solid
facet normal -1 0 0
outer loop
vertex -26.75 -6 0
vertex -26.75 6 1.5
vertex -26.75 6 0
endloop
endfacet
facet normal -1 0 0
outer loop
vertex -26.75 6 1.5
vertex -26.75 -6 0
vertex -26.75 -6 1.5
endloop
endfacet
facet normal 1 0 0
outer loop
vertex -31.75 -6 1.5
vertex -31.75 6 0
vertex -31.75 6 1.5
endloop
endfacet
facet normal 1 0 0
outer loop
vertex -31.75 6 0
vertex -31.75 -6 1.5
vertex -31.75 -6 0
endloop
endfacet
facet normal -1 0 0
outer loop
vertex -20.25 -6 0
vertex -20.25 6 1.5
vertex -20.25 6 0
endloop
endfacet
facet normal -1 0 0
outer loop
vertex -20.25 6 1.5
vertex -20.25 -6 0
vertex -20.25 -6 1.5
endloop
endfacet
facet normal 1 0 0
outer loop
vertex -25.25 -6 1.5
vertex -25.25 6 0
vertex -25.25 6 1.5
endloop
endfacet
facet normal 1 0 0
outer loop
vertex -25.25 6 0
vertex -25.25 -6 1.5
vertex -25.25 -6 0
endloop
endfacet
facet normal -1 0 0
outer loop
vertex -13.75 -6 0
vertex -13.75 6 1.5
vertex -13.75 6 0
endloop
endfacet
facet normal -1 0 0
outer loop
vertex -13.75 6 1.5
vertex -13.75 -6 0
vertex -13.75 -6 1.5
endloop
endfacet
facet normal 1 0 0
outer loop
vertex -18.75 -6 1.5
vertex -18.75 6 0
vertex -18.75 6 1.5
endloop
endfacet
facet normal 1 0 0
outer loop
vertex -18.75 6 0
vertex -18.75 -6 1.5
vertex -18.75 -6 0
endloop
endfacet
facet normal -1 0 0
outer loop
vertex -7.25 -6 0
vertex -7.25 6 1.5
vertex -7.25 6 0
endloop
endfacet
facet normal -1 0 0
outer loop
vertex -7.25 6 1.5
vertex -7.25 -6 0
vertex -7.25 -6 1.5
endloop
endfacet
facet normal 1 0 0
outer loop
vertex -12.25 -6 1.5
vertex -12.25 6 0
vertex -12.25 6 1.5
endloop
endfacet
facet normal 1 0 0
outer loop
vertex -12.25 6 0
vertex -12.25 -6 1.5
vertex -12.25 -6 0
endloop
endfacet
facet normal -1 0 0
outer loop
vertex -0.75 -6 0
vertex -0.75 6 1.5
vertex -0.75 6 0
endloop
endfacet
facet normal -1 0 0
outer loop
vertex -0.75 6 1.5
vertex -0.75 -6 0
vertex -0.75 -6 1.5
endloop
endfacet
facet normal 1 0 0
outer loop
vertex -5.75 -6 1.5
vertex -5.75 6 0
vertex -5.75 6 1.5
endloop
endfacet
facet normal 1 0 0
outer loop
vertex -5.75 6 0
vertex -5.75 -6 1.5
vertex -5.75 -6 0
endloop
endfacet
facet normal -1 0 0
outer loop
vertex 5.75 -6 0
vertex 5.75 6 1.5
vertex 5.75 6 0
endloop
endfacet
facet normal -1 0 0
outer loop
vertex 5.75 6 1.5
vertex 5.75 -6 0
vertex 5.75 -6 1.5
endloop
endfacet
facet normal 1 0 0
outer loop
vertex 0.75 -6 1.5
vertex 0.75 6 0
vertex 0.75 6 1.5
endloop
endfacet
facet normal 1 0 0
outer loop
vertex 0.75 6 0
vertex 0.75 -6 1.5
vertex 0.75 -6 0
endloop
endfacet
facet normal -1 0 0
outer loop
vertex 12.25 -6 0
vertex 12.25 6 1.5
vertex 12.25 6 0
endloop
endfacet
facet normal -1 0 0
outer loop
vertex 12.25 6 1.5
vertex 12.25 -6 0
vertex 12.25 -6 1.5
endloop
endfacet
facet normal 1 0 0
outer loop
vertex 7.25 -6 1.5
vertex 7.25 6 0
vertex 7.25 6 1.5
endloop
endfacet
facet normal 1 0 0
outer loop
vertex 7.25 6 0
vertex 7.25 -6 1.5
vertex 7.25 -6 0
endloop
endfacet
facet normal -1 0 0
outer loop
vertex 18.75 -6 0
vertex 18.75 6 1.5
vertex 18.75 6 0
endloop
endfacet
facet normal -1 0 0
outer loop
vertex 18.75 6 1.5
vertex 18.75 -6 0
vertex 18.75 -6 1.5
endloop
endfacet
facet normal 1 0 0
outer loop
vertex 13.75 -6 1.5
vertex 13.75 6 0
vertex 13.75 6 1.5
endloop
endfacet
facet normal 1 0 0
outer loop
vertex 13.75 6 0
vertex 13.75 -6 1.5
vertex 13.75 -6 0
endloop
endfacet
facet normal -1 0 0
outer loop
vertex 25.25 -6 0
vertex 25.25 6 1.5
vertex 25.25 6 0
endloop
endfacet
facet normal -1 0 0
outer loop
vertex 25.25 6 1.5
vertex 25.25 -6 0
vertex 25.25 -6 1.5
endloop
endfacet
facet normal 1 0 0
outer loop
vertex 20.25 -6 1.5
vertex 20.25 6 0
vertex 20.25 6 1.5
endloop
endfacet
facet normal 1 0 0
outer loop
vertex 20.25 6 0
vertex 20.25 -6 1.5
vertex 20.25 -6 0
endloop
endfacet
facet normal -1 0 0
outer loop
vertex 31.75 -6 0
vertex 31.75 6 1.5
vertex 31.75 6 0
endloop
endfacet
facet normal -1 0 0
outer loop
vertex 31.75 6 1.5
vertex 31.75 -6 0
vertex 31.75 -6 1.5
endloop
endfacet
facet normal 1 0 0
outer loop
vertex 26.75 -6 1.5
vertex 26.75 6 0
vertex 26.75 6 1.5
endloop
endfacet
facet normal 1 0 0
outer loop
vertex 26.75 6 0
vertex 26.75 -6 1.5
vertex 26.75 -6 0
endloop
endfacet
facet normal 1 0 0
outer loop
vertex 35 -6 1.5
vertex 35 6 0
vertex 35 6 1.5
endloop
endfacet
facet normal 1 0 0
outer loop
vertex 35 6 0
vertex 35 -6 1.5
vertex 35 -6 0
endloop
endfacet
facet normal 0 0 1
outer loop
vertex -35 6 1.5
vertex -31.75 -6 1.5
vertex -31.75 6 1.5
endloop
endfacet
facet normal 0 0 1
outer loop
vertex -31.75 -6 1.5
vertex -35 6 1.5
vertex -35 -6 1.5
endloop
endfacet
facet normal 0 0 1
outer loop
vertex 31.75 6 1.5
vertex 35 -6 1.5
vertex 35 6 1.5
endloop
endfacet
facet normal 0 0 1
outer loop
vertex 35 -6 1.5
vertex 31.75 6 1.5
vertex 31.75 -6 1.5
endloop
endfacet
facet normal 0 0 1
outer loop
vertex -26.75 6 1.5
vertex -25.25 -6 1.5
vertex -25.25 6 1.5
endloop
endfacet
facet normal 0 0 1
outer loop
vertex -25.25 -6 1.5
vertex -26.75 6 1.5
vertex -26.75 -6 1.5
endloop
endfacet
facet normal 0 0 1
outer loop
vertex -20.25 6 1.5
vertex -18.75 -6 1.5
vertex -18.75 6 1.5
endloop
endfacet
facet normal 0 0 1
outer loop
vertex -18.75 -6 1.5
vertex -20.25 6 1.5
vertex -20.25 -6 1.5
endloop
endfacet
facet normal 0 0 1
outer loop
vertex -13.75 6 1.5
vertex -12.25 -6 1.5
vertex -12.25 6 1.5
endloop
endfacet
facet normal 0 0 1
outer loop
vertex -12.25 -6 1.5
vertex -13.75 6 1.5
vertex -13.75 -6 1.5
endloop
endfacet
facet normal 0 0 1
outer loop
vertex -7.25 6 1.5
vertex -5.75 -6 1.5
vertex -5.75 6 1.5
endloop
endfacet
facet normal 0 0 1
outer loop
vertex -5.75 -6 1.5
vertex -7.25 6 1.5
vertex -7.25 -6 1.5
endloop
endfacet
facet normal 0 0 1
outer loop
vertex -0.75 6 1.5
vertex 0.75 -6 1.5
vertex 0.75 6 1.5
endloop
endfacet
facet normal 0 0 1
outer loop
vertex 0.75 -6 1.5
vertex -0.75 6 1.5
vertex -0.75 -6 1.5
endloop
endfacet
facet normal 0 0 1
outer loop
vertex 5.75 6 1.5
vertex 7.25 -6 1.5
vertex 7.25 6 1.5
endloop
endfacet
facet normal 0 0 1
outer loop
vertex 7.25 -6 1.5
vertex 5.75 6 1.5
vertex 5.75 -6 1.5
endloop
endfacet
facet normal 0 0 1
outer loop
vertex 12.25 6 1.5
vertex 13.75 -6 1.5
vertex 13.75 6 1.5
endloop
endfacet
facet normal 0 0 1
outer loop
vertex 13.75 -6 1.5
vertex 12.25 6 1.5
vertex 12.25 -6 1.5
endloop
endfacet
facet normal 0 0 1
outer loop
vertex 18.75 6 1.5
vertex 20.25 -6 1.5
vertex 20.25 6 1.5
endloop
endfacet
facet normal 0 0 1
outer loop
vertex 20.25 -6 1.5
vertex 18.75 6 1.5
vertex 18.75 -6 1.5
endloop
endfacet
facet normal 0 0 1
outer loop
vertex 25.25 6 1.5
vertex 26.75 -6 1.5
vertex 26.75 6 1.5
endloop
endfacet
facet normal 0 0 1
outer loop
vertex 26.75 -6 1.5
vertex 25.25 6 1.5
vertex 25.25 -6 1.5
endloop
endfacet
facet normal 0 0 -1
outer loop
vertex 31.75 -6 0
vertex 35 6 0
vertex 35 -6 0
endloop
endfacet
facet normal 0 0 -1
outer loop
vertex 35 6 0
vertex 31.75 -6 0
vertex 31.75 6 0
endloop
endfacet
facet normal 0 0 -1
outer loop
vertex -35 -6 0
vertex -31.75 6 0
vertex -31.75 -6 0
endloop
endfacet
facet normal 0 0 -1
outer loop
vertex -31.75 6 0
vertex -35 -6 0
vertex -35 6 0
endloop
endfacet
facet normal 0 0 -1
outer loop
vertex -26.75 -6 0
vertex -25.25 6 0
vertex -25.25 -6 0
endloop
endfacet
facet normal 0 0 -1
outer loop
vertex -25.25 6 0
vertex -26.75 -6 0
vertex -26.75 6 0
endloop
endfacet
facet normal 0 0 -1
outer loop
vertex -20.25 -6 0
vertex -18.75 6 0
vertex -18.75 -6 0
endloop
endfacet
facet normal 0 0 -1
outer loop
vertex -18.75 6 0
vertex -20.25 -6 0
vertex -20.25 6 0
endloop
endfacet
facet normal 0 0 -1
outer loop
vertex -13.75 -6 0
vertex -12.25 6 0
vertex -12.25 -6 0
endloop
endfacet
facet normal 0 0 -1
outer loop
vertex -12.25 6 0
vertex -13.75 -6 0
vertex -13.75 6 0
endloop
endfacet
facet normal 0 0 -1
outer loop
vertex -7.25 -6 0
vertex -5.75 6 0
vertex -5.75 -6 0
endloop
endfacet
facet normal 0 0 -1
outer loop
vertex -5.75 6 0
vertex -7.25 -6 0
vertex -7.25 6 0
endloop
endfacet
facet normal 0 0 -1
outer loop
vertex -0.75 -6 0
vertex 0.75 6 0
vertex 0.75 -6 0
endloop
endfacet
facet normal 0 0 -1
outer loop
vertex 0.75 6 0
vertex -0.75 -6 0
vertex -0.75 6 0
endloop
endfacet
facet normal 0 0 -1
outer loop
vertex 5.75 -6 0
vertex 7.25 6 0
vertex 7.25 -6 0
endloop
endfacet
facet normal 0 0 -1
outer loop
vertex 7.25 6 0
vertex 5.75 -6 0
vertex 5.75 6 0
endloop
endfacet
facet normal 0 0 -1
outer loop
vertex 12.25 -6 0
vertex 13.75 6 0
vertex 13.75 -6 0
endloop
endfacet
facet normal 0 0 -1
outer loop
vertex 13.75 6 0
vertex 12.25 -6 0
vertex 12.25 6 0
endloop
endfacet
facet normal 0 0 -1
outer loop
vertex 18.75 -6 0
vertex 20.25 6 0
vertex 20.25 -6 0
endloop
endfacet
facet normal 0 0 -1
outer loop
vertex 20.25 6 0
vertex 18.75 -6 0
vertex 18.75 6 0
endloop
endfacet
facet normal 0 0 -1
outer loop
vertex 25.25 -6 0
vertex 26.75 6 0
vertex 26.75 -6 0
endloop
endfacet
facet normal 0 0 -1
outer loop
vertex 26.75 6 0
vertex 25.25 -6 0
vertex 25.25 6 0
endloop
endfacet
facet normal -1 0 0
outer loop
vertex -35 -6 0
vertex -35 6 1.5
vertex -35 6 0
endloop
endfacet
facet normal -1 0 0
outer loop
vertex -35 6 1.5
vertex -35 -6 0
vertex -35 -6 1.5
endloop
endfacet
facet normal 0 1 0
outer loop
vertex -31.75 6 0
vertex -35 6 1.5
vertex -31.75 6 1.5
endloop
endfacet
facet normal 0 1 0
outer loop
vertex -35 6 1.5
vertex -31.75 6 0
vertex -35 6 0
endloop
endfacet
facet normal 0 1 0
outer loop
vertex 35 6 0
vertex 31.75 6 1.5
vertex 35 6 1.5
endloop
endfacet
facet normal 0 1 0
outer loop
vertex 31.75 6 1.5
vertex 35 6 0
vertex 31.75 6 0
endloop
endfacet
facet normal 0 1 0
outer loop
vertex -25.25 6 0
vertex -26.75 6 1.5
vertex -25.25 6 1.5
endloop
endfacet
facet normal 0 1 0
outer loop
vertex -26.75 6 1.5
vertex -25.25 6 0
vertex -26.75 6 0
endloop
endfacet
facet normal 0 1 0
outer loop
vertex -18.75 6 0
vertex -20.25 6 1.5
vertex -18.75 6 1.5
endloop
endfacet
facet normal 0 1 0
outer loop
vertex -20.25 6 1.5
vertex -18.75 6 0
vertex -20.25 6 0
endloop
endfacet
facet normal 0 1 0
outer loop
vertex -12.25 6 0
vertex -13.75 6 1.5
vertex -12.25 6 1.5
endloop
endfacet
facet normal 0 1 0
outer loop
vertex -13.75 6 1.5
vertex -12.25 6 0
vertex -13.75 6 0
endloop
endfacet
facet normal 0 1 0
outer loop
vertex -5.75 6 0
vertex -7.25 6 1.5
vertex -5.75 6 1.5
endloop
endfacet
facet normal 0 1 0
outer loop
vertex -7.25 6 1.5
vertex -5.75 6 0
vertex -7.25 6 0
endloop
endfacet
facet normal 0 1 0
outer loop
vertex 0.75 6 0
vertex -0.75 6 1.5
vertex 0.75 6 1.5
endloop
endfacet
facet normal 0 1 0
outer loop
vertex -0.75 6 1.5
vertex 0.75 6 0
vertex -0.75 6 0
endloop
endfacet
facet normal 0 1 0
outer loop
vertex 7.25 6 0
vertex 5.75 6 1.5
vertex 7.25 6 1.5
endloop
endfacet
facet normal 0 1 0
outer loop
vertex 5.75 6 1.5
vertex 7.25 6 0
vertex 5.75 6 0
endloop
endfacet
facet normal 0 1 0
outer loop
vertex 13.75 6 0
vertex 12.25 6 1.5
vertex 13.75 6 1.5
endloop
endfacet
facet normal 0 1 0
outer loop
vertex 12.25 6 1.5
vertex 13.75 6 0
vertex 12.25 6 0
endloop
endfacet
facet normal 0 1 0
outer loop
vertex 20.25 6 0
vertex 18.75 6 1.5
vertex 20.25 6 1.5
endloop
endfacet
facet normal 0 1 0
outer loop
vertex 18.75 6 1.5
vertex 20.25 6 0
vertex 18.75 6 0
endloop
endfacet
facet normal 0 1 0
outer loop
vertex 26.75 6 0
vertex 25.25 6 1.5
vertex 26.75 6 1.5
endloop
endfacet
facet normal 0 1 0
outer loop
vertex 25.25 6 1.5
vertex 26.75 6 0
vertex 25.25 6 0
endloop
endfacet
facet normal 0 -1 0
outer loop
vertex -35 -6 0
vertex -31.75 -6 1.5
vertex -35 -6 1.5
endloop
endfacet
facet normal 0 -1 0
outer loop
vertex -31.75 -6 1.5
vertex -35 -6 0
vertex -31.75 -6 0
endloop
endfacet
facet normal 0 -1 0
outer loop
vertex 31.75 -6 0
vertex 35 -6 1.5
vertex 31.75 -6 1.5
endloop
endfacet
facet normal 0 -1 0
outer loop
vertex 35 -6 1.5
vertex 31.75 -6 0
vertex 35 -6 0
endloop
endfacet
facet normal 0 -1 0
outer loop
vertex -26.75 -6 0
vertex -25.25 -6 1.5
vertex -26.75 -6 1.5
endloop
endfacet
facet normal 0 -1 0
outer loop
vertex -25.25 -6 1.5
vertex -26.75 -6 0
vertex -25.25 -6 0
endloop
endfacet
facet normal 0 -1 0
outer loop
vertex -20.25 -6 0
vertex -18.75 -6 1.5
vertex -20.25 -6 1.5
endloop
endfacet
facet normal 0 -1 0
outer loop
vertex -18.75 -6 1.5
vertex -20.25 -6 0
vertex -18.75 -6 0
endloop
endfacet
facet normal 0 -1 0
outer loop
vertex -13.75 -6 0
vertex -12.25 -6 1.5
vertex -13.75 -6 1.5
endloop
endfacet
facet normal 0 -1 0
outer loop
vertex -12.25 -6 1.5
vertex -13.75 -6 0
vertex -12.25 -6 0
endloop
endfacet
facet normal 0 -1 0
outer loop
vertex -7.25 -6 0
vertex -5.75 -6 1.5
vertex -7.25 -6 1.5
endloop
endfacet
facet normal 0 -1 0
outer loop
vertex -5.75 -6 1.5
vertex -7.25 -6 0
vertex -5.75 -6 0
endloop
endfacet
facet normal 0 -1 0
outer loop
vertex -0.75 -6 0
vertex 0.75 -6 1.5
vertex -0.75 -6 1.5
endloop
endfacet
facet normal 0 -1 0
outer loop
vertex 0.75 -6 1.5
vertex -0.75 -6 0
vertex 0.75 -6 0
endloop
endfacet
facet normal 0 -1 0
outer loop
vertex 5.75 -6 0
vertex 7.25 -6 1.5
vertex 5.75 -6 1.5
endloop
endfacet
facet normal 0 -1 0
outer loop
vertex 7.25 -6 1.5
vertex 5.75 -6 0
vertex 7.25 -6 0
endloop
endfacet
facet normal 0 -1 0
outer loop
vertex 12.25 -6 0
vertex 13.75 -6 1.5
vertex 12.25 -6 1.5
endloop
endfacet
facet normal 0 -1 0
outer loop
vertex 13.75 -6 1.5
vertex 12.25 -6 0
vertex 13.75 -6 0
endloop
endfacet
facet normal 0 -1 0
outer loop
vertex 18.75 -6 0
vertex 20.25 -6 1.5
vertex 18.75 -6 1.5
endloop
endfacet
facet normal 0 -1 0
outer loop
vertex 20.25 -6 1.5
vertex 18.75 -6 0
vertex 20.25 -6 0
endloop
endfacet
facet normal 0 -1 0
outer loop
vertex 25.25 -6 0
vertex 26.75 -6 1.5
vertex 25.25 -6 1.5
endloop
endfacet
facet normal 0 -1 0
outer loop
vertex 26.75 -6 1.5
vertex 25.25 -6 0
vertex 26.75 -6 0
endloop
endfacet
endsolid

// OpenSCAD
// 10-well comb for casting agarose gels
// Print orientation: flat on bed, teeth pointing down (-Y)

// ---------- Parameters ----------
plate_t      = 1.5;   // plate thickness (Z)
spine_l      = 70;    // spine length (X)
spine_w      = 12;    // spine width (Y)
tooth_count  = 10;    // number of teeth
tooth_w      = 5.0;   // tooth width (X)
tooth_l      = 12;    // tooth length (Y)
gap          = 1.5;   // gap between teeth (X)
eps          = 0.5;   // cutter overshoot past faces (Z)

$fn = 64;

// ---------- Derived ----------
pitch   = tooth_w + gap;            // centre-to-centre spacing of teeth
x_start = -(tooth_count - 1) * pitch / 2;  // first tooth centre (row centred on spine)

// ---------- Model ----------
difference() {
    // Base plate
    translate([-spine_l / 2, -spine_w / 2, 0])
        cube([spine_l, spine_w, plate_t]);

    // Teeth cut out from the plate
    for (i = [0 : tooth_count - 1])
        translate([x_start + i * pitch - tooth_w / 2,
                   -tooth_l / 2 - eps,
                   -eps])
            cube([tooth_w, tooth_l + 2 * eps, plate_t + 2 * eps]);
}
